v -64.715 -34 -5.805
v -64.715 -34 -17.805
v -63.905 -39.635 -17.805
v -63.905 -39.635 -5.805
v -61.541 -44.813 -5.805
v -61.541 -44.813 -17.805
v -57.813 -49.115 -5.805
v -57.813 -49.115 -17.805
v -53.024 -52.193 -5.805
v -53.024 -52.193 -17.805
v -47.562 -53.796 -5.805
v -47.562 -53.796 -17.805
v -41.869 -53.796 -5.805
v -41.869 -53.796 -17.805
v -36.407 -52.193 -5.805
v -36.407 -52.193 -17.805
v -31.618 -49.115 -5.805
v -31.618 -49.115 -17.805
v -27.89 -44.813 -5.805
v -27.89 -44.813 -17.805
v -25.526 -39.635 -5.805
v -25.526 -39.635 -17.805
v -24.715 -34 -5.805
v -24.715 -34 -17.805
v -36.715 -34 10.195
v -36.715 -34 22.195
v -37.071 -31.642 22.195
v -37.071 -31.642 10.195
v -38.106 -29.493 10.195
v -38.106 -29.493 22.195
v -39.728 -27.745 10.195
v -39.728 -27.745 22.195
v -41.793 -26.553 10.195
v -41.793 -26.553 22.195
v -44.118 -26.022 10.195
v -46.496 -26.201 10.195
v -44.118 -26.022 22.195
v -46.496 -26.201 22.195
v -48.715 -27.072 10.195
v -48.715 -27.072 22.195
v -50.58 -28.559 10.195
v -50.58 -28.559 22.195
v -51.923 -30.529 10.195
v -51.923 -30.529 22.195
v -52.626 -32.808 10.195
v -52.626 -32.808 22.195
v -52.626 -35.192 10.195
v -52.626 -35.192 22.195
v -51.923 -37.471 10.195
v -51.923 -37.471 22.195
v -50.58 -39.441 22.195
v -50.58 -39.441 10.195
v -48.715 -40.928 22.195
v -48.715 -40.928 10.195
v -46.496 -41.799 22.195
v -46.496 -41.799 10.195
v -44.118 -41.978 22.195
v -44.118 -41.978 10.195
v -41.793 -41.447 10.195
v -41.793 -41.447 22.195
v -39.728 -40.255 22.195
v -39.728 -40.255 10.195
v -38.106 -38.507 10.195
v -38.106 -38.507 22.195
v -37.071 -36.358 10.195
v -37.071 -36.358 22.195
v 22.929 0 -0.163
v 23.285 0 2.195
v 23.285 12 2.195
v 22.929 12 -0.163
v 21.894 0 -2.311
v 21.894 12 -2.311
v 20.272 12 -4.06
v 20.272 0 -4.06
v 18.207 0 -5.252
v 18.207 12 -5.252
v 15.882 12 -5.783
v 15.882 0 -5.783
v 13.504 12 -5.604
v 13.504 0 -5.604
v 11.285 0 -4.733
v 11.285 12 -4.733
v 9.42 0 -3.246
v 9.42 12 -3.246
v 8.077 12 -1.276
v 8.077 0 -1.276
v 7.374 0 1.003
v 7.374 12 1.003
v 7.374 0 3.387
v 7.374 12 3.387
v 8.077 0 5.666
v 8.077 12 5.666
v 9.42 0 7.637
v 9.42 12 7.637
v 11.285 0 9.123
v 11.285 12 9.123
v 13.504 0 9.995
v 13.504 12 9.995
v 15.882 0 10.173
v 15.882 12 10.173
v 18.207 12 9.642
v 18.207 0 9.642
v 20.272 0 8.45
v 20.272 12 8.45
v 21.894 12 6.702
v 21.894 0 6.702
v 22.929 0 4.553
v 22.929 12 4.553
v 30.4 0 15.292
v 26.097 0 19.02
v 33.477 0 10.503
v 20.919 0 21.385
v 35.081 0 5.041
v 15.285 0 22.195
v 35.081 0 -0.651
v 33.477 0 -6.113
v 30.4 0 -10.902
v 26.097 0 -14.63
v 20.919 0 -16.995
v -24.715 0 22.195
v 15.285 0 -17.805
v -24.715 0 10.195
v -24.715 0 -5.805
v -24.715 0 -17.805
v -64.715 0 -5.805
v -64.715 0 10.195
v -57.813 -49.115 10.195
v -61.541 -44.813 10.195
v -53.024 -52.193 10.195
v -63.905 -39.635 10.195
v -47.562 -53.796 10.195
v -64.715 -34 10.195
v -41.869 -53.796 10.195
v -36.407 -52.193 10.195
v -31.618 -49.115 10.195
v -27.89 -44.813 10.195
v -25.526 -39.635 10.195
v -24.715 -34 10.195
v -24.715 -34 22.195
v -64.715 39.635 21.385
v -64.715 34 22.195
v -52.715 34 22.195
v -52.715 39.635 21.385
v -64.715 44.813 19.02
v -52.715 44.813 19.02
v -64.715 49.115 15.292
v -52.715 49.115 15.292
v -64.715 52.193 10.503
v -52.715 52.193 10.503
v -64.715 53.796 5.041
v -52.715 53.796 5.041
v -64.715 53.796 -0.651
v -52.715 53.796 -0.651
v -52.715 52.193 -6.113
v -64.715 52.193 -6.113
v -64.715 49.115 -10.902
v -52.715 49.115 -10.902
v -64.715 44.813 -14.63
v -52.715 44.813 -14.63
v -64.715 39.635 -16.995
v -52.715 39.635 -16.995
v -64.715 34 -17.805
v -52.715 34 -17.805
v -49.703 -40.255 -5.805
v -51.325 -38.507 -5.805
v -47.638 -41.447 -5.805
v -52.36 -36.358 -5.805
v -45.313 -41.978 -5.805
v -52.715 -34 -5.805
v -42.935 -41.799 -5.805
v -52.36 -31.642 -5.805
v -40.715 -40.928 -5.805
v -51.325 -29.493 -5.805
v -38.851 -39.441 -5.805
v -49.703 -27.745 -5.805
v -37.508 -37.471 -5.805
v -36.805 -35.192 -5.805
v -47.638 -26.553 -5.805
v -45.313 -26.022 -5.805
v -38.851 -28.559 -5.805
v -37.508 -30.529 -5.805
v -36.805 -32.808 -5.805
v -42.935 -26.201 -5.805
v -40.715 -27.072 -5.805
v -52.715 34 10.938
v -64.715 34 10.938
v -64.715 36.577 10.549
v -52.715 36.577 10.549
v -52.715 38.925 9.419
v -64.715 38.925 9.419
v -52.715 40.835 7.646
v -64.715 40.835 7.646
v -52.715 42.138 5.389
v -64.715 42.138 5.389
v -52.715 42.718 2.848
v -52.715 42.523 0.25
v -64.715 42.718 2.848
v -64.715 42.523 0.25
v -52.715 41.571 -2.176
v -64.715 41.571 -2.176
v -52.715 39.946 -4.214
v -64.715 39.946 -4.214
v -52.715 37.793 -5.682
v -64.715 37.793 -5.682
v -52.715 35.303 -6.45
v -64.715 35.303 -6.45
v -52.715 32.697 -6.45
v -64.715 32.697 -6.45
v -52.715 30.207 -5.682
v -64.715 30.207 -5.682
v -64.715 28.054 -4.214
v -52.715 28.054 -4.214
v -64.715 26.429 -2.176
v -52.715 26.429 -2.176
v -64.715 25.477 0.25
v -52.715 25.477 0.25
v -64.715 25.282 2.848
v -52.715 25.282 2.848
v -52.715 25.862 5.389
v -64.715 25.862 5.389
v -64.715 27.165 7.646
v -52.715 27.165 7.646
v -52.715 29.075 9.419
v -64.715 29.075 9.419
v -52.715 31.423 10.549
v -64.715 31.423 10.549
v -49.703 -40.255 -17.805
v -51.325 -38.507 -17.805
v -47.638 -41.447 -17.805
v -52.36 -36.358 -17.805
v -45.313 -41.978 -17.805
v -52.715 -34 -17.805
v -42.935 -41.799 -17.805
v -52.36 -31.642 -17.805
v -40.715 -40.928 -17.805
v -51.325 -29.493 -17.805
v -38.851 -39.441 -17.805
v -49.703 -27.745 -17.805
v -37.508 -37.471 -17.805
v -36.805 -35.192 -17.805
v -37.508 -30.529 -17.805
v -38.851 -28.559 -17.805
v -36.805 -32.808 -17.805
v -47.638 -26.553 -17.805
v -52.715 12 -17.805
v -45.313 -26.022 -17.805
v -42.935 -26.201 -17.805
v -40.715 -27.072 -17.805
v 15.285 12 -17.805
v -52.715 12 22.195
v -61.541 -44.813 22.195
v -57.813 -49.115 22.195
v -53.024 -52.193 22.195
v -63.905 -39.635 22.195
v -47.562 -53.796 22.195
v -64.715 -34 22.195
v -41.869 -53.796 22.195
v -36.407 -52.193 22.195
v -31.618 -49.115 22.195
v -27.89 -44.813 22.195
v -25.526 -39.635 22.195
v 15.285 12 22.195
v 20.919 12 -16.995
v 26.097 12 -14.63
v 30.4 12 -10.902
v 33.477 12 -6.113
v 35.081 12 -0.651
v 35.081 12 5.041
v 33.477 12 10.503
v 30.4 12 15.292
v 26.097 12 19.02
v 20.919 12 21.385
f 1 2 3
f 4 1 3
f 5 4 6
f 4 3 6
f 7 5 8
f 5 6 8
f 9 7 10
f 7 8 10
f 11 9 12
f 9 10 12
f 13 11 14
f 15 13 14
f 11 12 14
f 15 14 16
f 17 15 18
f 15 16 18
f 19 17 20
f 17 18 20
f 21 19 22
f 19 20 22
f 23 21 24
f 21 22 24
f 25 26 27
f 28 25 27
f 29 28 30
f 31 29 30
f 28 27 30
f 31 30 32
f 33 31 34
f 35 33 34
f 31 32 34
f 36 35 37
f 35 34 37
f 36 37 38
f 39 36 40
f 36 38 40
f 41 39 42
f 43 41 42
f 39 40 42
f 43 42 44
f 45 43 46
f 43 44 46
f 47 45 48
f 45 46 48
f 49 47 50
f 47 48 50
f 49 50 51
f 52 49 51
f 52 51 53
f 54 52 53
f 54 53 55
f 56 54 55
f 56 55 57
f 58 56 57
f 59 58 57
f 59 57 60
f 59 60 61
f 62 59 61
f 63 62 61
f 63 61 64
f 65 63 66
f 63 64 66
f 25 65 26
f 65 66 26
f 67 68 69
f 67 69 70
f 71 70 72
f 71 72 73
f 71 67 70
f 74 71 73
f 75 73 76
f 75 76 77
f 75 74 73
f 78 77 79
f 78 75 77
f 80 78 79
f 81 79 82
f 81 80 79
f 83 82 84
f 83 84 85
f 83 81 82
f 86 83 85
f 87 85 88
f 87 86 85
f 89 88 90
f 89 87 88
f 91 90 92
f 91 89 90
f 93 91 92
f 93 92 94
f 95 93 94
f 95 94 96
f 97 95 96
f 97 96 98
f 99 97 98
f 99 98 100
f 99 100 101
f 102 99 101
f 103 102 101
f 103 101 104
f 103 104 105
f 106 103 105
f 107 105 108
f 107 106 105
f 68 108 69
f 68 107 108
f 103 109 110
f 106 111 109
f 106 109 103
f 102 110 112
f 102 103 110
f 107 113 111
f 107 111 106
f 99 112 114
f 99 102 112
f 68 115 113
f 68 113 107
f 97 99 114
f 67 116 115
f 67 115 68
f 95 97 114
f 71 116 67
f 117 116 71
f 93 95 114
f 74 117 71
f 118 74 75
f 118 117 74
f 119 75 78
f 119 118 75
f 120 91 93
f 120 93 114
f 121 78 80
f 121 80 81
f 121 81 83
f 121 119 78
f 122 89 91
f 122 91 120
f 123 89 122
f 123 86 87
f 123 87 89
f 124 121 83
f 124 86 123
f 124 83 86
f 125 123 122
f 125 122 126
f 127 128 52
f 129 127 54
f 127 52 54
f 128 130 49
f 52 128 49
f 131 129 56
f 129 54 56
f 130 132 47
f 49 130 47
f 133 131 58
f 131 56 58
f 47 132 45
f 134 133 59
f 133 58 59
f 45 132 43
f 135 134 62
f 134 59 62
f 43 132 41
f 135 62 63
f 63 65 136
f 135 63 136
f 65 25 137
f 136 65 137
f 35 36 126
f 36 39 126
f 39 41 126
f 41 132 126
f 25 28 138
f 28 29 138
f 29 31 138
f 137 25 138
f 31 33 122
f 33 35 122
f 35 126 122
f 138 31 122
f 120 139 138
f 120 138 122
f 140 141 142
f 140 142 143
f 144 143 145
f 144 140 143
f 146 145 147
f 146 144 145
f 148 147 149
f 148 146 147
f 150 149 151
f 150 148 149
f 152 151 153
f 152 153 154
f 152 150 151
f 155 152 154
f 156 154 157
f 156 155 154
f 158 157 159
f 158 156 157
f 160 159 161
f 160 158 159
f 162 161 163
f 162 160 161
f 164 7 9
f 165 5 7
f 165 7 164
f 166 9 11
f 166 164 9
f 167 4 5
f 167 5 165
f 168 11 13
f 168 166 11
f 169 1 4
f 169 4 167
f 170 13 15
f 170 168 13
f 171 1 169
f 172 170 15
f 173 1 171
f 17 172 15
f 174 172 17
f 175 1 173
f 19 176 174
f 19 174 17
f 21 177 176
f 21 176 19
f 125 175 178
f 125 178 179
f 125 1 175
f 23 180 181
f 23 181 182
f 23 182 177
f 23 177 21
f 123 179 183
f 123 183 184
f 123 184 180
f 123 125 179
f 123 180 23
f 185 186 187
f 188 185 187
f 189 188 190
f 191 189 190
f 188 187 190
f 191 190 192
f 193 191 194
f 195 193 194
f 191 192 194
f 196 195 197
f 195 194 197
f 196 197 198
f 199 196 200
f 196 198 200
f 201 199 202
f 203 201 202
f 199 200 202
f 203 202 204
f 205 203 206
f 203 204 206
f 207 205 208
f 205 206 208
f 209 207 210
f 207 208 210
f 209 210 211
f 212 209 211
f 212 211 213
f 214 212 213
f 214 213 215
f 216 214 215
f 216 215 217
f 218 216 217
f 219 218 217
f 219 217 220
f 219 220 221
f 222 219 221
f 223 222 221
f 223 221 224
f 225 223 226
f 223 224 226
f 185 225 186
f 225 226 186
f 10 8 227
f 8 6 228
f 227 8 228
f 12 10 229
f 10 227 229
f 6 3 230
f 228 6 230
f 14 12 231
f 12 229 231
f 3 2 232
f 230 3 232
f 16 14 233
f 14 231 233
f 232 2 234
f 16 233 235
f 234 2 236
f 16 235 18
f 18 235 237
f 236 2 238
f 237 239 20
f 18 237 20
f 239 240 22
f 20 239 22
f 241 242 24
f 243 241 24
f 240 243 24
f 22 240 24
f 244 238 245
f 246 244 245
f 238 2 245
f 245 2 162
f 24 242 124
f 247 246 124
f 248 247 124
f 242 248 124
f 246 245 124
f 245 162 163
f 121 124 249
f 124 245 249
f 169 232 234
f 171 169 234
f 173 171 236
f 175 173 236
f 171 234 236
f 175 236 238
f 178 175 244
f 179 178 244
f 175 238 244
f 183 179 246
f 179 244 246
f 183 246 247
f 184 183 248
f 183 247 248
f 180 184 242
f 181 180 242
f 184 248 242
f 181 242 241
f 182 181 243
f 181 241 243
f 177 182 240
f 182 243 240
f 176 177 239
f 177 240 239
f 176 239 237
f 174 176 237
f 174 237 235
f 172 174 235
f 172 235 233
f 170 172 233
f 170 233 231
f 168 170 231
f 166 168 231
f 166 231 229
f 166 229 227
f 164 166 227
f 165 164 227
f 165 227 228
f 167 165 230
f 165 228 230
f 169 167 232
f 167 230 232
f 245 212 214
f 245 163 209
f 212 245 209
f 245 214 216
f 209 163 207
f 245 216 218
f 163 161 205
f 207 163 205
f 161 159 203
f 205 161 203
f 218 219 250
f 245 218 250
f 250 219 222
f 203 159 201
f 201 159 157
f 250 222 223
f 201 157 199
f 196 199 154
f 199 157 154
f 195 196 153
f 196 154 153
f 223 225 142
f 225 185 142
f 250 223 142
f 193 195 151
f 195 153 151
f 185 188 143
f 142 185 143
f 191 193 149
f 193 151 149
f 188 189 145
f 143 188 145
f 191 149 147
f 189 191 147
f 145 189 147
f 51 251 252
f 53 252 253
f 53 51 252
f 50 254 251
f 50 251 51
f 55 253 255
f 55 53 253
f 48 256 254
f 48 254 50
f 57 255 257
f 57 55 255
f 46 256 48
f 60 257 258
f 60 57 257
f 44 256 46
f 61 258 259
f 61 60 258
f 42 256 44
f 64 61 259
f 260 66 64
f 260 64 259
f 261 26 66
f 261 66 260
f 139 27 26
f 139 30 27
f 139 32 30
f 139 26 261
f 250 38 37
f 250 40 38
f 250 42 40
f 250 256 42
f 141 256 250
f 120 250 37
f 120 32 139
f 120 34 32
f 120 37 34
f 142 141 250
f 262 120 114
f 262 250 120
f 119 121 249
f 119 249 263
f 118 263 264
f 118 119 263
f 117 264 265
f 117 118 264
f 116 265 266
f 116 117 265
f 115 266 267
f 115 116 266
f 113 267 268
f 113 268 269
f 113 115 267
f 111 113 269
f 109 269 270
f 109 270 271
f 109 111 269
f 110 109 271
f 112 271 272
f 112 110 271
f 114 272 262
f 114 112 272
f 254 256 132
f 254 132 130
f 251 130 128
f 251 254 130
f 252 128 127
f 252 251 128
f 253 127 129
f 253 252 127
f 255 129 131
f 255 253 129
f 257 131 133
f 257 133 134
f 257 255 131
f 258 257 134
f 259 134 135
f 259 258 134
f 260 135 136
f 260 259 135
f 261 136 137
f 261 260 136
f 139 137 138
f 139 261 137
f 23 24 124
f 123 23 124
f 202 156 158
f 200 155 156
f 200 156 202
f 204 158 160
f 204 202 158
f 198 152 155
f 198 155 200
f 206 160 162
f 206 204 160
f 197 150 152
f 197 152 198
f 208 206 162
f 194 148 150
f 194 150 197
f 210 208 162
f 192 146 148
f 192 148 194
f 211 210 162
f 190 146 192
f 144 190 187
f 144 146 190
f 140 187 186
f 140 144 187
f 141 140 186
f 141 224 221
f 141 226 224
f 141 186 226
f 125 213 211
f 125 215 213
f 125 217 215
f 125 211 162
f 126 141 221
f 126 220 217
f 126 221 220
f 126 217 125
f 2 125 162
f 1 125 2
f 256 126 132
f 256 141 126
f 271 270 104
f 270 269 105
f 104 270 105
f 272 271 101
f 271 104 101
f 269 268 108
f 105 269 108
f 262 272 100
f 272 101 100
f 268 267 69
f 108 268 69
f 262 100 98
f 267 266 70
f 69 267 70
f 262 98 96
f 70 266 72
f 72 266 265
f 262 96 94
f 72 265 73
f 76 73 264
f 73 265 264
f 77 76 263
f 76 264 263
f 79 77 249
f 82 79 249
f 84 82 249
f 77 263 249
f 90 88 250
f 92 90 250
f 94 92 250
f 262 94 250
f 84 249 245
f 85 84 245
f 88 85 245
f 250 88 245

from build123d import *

# Parameters (mm, degrees)
SKETCH1_R           = 8
BOSS_EXTRUDE2_DEPTH = 12
SKETCH3_R           = 8.742551749
BOSS_EXTRUDE3_DEPTH = 12
SKETCH4_R           = 8
BOSS_EXTRUDE4_DEPTH = 12
SKETCH5_R           = 8
BOSS_EXTRUDE5_DEPTH = 12


with BuildPart() as part:
    # Sketch1 → Boss-Extrude2 (new body)
    with BuildSketch(Plane(origin=(0, 0, 0), x_dir=(1, 0, 0), z_dir=(0, 1, 0))):
        with BuildLine():
            Line((-64.715447154, 17.804878049), (15.284552846, 17.804878049))
            ThreePointArc((15.284552846, 17.804878049), (35.284552846, -2.195121951), (15.284552846, -22.195121951))
            Line((15.284552846, -22.195121951), (-64.715447154, -22.195121951))
            Line((-64.715447154, -22.195121951), (-64.715447154, 17.804878049))
        make_face()
        with Locations((15.284552846, -2.195121951)):
            Circle(SKETCH1_R, mode=Mode.SUBTRACT)
    extrude(amount=BOSS_EXTRUDE2_DEPTH)

    # Sketch3 → Boss-Extrude3 (add)
    with BuildSketch(Plane.ZY.offset(64.715447154)):
        with BuildLine():
            ThreePointArc((22.195121951, 34), (2.195121951, 54), (-17.804878049, 34))
            Line((-17.804878049, 34), (-17.804878049, 12))
            Line((-17.804878049, 12), (22.195121951, 12))
            Line((22.195121951, 12), (22.195121951, 34))
        make_face()
        with Locations((2.195121951, 34)):
            Circle(SKETCH3_R, mode=Mode.SUBTRACT)
    extrude(amount=-BOSS_EXTRUDE3_DEPTH)

    # Sketch4 → Boss-Extrude4 (add)
    with BuildSketch(Plane(origin=(0, 0, -17.804878049), x_dir=(-1, 0, 0), z_dir=(0, 0, -1))):
        with BuildLine():
            Line((64.715447154, 0), (64.715447154, -34))
            ThreePointArc((64.715447154, -34), (44.715447154, -54), (24.715447154, -34))
            Line((24.715447154, -34), (24.715447154, 0))
            Line((24.715447154, 0), (64.715447154, 0))
        make_face()
        with Locations((44.715447154, -34)):
            Circle(SKETCH4_R, mode=Mode.SUBTRACT)
    extrude(amount=-BOSS_EXTRUDE4_DEPTH)

    # Sketch5 → Boss-Extrude5 (add)
    with BuildSketch(Plane.XY.offset(22.195121951)):
        with BuildLine():
            Line((-64.715447154, 0), (-64.715447154, -34))
            ThreePointArc((-64.715447154, -34), (-44.715447154, -54), (-24.715447154, -34))
            Line((-24.715447154, -34), (-24.715447154, 0))
            Line((-24.715447154, 0), (-64.715447154, 0))
        make_face()
        with Locations((-44.715447154, -34)):
            Circle(SKETCH5_R, mode=Mode.SUBTRACT)
    extrude(amount=-BOSS_EXTRUDE5_DEPTH)


solid = part.part
